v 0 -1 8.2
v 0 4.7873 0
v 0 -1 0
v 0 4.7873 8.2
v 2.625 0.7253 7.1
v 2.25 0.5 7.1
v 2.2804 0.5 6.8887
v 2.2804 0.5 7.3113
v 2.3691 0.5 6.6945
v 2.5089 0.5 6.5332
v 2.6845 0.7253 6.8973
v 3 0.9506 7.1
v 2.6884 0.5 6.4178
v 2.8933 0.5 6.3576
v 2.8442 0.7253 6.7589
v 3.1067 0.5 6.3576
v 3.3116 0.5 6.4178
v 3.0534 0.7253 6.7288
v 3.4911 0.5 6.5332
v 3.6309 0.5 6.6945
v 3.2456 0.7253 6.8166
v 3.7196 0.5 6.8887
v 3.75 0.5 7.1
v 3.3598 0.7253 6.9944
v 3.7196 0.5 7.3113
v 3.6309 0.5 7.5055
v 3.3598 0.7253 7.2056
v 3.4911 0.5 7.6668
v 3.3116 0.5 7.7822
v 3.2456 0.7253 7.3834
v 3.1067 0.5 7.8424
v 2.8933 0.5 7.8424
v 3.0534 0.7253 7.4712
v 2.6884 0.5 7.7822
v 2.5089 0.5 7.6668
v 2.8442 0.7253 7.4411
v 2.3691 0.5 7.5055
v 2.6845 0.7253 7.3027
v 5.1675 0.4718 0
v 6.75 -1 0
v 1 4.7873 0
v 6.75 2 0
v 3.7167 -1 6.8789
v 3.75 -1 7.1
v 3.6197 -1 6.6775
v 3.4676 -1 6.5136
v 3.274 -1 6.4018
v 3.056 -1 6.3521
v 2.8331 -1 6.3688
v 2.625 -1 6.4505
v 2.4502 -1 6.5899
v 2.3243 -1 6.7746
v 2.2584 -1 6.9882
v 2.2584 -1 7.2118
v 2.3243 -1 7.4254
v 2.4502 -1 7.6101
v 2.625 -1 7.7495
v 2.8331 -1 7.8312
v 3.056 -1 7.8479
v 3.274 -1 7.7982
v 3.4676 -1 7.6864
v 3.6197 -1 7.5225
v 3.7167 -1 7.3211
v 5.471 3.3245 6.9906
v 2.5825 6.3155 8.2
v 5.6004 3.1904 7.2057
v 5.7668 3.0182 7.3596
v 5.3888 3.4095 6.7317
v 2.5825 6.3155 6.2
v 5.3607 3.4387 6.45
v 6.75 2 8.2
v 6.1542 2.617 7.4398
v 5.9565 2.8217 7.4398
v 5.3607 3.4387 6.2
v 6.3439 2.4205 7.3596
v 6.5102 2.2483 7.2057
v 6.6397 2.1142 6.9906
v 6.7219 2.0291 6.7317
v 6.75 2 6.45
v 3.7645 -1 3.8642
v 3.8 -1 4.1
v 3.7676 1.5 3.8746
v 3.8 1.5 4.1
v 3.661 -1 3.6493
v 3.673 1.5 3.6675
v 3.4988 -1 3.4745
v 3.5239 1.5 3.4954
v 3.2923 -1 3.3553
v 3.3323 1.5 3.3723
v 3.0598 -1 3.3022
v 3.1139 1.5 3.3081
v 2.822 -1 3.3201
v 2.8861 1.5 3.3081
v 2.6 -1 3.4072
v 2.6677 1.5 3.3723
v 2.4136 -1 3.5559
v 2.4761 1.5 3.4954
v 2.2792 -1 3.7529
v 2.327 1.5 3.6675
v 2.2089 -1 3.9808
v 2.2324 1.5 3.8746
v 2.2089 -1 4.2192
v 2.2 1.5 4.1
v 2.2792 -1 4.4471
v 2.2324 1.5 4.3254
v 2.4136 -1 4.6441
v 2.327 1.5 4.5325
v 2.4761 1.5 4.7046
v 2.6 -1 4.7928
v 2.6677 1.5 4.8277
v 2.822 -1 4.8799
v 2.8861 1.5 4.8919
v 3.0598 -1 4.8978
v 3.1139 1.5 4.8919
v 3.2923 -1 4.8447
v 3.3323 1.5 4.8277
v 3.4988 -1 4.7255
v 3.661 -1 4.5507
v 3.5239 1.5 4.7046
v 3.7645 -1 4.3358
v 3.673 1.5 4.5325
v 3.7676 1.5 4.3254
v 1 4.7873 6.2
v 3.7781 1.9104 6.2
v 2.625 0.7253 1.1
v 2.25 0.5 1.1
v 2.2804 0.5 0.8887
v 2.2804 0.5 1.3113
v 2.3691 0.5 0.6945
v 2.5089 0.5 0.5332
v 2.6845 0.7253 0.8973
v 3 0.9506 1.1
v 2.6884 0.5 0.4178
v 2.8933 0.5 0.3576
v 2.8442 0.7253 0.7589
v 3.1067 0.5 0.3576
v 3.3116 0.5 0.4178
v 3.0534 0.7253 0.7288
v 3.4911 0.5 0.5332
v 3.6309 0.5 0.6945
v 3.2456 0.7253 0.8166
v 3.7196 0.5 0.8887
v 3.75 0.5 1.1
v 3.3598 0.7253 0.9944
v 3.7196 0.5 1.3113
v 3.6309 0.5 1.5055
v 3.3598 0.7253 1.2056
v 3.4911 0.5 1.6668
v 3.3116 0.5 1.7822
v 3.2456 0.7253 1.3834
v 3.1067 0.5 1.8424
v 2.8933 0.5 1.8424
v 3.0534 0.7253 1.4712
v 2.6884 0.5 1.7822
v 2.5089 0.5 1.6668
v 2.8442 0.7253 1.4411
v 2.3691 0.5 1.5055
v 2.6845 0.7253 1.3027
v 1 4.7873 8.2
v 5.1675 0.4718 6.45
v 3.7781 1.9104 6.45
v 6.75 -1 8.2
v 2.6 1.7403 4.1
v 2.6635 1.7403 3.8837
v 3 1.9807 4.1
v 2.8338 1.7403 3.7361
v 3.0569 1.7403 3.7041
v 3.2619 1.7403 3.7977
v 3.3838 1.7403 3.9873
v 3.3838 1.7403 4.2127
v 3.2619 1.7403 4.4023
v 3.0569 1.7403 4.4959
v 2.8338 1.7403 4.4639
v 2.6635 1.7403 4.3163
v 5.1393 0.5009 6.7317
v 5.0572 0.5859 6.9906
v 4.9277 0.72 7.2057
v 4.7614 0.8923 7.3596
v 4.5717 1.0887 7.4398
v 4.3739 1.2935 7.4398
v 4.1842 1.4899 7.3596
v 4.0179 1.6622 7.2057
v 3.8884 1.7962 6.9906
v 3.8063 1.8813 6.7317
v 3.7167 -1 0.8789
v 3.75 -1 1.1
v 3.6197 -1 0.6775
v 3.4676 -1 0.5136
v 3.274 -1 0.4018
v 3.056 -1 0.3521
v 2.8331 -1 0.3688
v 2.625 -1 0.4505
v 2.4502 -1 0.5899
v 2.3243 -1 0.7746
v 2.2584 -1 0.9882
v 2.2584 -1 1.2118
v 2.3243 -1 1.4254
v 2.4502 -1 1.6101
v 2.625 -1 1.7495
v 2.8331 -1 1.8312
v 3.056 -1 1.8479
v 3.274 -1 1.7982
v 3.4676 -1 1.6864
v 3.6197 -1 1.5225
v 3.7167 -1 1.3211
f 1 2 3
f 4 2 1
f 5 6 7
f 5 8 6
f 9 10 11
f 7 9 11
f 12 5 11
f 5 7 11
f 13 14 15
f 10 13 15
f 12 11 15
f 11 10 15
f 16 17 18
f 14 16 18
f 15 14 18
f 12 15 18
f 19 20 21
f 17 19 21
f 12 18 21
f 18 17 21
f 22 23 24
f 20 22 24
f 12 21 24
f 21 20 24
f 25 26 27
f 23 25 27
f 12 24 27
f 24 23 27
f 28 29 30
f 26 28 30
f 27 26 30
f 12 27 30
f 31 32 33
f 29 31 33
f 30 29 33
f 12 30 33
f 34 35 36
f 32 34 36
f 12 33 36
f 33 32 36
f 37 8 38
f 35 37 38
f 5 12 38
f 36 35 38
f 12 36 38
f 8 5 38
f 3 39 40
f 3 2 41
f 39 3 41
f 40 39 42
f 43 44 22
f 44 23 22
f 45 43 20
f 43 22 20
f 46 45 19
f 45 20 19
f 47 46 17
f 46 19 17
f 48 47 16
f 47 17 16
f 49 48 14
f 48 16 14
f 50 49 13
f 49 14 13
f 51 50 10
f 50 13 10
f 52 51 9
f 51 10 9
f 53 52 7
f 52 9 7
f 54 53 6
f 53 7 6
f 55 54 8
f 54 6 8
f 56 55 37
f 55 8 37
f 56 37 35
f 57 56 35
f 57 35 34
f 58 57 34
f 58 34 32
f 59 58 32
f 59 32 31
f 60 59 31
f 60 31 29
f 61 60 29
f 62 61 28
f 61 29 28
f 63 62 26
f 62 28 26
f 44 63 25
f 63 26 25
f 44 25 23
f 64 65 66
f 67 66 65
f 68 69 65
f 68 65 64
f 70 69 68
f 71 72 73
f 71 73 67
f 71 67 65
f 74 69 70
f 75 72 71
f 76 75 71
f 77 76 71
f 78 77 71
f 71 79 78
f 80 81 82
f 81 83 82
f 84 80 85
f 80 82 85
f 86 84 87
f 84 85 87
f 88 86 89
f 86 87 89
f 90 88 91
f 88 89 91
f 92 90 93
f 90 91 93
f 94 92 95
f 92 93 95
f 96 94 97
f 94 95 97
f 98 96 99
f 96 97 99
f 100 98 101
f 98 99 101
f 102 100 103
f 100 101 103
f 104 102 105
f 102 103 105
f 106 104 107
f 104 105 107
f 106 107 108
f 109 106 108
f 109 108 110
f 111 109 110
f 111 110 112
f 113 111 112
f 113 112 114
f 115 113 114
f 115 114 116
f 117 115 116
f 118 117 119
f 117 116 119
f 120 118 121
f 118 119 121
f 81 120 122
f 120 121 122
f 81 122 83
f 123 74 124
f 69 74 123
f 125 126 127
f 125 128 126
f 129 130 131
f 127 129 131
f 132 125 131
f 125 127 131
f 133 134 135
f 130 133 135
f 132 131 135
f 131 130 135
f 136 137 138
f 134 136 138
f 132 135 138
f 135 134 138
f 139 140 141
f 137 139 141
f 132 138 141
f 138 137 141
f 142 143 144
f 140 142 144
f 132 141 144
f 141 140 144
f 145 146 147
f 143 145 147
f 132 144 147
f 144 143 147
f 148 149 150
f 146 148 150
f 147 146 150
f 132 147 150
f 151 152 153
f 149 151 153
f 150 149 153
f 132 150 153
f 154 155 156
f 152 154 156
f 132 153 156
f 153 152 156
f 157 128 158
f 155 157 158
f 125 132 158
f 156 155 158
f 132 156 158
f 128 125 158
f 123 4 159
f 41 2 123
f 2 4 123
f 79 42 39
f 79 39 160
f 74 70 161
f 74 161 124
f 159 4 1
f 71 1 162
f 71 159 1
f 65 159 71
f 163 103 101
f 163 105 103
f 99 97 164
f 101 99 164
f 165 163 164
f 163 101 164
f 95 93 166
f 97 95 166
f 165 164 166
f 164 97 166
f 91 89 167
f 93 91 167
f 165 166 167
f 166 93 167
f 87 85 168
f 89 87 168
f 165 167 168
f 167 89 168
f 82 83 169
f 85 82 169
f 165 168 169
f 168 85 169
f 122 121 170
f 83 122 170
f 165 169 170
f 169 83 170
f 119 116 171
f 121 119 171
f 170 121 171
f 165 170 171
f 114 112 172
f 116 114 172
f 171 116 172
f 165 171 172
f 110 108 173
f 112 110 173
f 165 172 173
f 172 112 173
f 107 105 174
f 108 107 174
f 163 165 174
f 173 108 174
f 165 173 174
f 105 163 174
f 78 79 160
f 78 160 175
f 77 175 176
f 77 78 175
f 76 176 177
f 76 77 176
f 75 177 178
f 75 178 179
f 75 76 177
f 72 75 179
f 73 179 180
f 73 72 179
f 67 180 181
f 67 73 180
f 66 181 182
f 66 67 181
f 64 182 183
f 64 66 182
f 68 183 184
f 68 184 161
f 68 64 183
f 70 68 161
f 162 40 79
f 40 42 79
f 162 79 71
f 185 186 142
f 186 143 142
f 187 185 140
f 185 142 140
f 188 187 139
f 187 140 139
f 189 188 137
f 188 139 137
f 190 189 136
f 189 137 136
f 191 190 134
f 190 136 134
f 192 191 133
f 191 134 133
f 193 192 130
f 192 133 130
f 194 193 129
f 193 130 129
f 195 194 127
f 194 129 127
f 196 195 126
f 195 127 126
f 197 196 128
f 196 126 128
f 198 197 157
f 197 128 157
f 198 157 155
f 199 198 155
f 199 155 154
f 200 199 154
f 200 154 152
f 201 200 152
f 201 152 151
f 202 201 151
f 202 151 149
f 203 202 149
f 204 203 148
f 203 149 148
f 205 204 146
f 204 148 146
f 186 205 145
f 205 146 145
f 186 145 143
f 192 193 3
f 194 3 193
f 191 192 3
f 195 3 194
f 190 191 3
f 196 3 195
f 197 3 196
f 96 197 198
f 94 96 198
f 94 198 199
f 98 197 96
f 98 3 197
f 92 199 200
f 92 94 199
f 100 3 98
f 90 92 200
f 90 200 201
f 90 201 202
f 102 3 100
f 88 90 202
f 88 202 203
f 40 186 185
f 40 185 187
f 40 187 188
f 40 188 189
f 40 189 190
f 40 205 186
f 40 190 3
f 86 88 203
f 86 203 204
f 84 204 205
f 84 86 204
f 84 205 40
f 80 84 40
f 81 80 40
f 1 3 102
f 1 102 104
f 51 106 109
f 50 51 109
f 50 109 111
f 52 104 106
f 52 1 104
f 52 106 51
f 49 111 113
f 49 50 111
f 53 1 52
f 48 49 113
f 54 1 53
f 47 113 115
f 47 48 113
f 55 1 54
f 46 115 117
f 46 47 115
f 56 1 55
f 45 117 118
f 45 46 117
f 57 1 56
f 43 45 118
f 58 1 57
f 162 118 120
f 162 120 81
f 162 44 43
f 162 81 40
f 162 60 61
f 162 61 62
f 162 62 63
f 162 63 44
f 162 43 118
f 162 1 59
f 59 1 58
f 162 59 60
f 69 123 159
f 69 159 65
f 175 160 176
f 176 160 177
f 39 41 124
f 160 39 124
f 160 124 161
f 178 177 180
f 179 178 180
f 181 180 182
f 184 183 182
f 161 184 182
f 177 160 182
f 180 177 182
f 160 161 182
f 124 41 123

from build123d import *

# Parameters (mm, degrees)
BOSS_EXTRUDE1_DEPTH       = 8.2
CUT_EXTRUDE1_DEPTH        = 2.2
SKETCH7_W                 = 6.75
SKETCH7_H                 = 8.2
BOSS_EXTRUDE2_DEPTH       = 1
F_1_5MM_DOWEL_HOLE1_D     = 1.5
F_1_5MM_DOWEL_HOLE1_DEPTH = 1.5
F_1_5MM_DOWEL_HOLE1_TIP   = 0.450645464
M2X0_4_TAPPED_HOLE1_D     = 1.6
M2X0_4_TAPPED_HOLE1_DEPTH = 2.5
M2X0_4_TAPPED_HOLE1_TIP   = 0.480688495


with BuildPart() as part:
    # Sketch1 → Boss-Extrude1 (new body)
    with BuildSketch(Plane.XY):
        Polygon((0, 0), (0, 4.787274917), (1, 4.787274917), (2.582547561, 6.315523332), (6.75, 2), (6.75, 0), align=None)
    extrude(amount=BOSS_EXTRUDE1_DEPTH)

    # Sketch2 → Cut-Extrude1 (cut)
    with BuildSketch(Plane(origin=(4.492176628, 4.338044544, 0), x_dir=(0, 0, -1), z_dir=(0.7193398, 0.69465837, 0))):
        with BuildLine():
            Line((0, -3.2502644), (-6.45, -3.2502644))
            ThreePointArc((-6.45, -3.2502644), (-7.45, -2.2502644), (-6.45, -1.2502644))
            Line((-6.45, -1.2502644), (-6.2, -1.2502644))
            Line((-6.2, -1.2502644), (-6.2, 3.2497356))
            Line((-6.2, 3.2497356), (0, 3.2497356))
            Line((0, 3.2497356), (0, -3.2502644))
        make_face()
    extrude(amount=-CUT_EXTRUDE1_DEPTH, mode=Mode.SUBTRACT)

    # Sketch7 → Boss-Extrude2 (add)
    with BuildSketch(Plane.XZ):
        with Locations((3.375, 4.1)):
            Rectangle(SKETCH7_W, SKETCH7_H)
    extrude(amount=BOSS_EXTRUDE2_DEPTH)

    # Ø1.5mm Dowel Hole1
    with Locations(Plane(origin=(0, -1, 0), x_dir=(-1, 0, 0), z_dir=(0, -1, 0))):
        with Locations((-3, -7.1), (-3, -1.1)):
            Hole(F_1_5MM_DOWEL_HOLE1_D / 2, depth=F_1_5MM_DOWEL_HOLE1_DEPTH)
            with Locations((0, 0, -(F_1_5MM_DOWEL_HOLE1_DEPTH + F_1_5MM_DOWEL_HOLE1_TIP / 2))):  # 118° drill point
                Cone(0, F_1_5MM_DOWEL_HOLE1_D / 2, F_1_5MM_DOWEL_HOLE1_TIP, mode=Mode.SUBTRACT)

    # M2x0.4 Tapped Hole1
    with Locations(Plane(origin=(0, -1, 0), x_dir=(-1, 0, 0), z_dir=(0, -1, 0))):
        with Locations((-3, -4.1)):
            Hole(M2X0_4_TAPPED_HOLE1_D / 2, depth=M2X0_4_TAPPED_HOLE1_DEPTH)
            with Locations((0, 0, -(M2X0_4_TAPPED_HOLE1_DEPTH + M2X0_4_TAPPED_HOLE1_TIP / 2))):  # 118° drill point
                Cone(0, M2X0_4_TAPPED_HOLE1_D / 2, M2X0_4_TAPPED_HOLE1_TIP, mode=Mode.SUBTRACT)


solid = part.part
